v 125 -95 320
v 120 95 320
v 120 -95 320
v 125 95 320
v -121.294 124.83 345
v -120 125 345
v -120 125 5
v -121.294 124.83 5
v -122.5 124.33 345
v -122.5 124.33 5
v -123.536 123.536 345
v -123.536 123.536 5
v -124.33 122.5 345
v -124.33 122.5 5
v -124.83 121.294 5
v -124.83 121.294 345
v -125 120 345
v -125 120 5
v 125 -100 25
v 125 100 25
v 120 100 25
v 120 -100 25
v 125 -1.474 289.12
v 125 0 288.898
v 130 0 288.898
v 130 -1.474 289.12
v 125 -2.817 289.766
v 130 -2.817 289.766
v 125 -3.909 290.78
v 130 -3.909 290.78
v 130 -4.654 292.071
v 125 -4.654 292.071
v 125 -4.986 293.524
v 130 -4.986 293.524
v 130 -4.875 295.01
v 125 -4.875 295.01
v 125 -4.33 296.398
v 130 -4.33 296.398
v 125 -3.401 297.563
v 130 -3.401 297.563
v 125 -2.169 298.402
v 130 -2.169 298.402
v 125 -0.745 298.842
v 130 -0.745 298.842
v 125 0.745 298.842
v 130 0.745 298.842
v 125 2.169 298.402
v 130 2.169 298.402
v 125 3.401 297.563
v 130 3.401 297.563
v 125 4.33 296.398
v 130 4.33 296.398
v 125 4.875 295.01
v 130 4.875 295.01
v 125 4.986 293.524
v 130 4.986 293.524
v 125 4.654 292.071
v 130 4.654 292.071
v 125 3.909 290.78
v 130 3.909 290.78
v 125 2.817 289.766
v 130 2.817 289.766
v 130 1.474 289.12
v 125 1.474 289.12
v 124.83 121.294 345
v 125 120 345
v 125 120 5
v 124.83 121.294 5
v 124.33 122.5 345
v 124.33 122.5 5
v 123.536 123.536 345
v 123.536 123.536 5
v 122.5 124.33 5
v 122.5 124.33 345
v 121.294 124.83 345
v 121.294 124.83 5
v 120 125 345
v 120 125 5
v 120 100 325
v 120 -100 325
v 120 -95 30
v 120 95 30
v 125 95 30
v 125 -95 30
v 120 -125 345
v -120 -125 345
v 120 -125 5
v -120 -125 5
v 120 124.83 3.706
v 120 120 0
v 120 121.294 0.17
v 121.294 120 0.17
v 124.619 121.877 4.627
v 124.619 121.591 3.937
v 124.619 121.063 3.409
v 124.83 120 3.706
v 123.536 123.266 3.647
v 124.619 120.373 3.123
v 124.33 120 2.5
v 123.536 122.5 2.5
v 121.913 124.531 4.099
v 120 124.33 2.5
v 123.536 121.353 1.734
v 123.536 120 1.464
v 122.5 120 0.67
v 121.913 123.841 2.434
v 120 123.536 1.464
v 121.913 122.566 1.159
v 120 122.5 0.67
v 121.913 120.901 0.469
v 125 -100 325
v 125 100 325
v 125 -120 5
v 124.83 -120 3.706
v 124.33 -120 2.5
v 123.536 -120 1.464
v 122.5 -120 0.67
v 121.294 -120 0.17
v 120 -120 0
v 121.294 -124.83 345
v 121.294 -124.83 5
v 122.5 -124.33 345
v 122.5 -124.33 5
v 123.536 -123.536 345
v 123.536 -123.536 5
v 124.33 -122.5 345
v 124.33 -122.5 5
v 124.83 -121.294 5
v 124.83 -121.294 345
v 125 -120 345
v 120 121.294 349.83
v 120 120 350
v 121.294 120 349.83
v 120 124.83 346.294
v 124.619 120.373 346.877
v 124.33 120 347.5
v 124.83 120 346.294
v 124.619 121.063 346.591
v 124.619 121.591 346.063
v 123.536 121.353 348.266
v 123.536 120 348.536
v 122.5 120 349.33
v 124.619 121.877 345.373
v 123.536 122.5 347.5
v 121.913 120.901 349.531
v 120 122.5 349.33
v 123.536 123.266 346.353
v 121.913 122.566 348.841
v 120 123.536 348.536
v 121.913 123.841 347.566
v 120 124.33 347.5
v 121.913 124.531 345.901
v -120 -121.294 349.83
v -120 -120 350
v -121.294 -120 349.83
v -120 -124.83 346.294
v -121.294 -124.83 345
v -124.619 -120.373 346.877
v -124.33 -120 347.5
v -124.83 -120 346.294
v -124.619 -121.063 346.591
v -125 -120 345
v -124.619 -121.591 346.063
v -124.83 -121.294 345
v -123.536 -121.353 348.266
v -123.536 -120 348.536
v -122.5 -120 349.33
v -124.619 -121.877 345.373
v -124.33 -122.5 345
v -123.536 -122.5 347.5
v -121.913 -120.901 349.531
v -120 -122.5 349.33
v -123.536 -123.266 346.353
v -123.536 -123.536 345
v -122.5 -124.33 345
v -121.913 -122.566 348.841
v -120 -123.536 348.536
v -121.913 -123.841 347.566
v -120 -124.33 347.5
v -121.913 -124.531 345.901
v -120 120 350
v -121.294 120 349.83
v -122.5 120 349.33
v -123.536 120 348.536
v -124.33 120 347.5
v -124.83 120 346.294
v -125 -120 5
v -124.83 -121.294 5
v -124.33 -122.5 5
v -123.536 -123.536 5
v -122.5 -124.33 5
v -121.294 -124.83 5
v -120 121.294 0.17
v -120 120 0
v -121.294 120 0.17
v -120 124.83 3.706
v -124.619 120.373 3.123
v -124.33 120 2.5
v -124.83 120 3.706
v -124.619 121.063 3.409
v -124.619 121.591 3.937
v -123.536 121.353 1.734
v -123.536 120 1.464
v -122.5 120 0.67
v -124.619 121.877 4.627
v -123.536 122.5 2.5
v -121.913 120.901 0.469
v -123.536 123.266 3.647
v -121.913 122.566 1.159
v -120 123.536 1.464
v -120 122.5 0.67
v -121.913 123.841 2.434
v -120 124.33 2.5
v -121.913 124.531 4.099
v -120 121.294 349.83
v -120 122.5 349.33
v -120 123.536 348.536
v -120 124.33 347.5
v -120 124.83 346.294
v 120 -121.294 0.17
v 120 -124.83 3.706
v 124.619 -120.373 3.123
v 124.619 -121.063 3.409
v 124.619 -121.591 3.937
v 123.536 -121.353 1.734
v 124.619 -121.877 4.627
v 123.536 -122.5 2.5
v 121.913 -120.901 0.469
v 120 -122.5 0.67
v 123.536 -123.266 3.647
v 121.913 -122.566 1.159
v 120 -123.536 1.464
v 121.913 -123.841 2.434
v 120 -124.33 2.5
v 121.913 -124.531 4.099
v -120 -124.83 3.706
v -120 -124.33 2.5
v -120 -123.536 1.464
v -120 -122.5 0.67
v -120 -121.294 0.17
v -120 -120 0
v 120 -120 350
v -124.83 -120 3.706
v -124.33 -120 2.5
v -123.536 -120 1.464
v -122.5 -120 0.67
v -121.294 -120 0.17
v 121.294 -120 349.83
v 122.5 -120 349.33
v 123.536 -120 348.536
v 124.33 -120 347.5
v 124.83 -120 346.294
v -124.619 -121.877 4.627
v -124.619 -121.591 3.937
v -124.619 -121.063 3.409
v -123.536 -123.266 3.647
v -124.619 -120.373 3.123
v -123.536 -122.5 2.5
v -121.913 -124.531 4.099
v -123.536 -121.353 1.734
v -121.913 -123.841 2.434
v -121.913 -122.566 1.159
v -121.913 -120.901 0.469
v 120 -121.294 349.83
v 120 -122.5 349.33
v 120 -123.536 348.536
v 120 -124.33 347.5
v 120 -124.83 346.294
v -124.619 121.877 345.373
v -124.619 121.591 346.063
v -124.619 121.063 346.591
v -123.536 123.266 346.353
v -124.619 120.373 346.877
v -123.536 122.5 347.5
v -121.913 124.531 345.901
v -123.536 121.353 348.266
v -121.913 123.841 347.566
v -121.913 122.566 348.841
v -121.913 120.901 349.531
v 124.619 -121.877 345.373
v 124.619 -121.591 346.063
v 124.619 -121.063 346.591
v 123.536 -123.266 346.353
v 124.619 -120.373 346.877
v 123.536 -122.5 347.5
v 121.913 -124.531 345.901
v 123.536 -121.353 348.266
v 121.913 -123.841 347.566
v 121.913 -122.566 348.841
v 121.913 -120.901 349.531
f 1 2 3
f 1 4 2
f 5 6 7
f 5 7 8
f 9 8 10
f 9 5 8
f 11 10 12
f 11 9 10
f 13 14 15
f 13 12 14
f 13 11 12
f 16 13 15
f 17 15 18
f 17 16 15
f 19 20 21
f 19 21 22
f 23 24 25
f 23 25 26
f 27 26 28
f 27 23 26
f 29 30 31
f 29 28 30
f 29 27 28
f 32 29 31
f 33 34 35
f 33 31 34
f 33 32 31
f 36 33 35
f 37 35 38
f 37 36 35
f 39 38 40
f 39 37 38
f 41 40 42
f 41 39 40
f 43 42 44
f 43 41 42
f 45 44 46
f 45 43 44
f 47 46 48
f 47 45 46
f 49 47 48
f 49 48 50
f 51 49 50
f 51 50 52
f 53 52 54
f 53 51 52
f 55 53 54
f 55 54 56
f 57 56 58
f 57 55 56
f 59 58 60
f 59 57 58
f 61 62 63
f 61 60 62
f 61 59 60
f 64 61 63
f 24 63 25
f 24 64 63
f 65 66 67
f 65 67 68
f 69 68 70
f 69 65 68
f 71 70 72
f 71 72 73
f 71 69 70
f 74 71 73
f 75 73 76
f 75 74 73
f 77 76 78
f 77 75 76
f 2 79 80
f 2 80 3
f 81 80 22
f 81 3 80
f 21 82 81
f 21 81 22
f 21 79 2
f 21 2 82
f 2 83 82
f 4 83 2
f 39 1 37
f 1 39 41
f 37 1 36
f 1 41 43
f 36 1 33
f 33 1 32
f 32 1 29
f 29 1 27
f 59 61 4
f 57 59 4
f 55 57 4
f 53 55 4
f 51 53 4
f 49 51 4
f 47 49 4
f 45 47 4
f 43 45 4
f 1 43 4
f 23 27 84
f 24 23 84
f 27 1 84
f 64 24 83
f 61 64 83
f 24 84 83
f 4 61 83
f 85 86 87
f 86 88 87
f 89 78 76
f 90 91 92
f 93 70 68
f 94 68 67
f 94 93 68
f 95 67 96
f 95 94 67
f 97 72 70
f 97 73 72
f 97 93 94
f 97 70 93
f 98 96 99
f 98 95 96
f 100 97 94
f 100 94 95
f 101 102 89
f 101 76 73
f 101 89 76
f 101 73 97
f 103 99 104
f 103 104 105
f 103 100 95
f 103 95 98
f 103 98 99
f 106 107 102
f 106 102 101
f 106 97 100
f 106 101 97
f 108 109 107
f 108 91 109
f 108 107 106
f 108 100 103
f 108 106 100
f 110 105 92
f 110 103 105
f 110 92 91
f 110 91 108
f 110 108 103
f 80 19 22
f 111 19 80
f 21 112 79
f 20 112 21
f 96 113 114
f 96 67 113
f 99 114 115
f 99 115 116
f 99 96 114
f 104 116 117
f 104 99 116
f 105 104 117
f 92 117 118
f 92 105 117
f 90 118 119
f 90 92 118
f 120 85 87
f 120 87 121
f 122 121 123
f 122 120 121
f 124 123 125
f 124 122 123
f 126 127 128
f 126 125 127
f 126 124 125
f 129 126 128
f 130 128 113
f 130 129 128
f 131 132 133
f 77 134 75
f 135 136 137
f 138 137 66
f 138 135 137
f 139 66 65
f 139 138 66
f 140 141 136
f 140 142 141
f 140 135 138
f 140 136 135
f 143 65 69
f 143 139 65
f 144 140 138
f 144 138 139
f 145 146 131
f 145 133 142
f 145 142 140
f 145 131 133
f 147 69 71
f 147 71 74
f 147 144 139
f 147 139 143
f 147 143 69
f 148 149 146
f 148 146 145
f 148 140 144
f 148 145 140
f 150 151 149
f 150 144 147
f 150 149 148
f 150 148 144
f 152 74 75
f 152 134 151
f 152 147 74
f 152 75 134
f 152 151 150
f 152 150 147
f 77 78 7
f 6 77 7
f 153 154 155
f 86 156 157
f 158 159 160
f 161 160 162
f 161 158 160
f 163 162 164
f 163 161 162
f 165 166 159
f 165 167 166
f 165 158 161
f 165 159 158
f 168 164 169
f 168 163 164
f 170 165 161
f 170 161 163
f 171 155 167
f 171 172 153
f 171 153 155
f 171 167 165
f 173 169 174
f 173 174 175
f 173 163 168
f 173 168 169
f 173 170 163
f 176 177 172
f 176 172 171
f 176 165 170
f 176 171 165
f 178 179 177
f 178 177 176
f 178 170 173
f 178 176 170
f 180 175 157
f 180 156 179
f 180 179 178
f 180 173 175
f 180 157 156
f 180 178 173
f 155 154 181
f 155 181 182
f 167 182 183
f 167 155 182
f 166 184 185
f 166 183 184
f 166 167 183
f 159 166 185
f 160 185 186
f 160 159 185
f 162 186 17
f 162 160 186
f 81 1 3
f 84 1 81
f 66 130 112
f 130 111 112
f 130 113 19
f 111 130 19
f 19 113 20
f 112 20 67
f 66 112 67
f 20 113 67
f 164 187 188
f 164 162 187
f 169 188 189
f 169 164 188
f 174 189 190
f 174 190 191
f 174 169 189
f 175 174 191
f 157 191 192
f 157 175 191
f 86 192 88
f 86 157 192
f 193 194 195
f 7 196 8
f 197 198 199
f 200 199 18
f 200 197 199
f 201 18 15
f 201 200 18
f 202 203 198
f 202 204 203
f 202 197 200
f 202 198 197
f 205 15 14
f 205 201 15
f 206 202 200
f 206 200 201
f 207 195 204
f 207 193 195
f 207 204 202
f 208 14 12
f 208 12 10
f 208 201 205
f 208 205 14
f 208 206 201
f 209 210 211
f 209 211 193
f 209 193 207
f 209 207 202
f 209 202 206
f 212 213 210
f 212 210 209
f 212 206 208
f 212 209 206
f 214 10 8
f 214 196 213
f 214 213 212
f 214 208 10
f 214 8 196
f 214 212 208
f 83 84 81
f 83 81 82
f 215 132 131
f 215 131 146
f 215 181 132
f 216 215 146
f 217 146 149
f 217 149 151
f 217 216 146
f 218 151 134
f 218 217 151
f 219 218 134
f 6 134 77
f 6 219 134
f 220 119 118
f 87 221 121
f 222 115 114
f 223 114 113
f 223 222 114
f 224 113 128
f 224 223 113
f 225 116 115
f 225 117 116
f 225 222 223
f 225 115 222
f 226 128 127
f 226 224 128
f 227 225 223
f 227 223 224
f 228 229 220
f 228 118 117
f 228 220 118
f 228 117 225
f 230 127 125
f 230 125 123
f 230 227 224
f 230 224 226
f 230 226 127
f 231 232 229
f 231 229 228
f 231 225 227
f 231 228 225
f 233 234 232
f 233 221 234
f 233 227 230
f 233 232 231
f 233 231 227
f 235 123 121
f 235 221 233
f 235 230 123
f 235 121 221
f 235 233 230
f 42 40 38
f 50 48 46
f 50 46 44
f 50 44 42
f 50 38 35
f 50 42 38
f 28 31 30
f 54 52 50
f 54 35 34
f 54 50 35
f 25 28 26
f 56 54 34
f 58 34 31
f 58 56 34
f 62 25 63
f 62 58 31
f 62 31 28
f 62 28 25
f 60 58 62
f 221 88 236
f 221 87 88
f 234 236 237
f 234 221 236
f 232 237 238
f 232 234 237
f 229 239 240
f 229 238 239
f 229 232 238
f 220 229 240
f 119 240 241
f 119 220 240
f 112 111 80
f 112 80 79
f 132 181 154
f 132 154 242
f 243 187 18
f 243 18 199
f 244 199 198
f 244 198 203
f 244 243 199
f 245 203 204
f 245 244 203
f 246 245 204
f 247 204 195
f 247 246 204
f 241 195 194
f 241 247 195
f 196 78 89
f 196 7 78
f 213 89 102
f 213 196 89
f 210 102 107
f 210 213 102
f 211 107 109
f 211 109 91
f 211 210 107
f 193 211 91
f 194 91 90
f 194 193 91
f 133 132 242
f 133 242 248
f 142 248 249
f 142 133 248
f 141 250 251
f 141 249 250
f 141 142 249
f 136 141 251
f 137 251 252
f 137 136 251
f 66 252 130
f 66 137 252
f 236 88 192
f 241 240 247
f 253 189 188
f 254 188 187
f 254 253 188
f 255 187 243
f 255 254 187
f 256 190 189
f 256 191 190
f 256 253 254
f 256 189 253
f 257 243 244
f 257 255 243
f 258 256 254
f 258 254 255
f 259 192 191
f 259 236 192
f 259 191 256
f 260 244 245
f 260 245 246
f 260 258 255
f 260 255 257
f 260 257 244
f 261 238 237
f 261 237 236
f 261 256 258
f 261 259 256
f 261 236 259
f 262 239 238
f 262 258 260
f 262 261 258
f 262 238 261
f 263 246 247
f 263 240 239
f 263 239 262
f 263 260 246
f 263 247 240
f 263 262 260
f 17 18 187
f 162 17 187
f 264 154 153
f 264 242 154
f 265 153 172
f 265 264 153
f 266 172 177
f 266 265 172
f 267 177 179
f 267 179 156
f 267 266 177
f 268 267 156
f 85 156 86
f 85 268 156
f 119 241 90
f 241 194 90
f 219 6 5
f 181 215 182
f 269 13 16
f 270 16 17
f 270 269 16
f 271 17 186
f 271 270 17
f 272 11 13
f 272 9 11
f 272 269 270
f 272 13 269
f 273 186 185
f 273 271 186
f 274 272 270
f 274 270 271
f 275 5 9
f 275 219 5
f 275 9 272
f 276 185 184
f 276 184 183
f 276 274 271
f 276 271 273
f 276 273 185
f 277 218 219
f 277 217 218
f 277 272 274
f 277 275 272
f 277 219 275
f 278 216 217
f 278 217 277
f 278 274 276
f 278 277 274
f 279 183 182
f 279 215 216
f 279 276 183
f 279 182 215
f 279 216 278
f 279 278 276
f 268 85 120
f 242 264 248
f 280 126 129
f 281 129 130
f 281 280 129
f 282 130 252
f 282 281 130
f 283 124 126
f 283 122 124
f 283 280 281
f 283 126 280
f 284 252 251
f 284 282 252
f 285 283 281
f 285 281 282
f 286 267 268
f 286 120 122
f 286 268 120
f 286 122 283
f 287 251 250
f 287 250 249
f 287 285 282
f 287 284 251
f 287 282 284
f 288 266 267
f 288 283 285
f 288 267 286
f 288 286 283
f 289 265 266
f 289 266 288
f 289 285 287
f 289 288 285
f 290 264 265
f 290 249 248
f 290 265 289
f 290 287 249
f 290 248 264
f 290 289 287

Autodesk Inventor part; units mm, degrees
ref_plane "YZ Plane" through (0, 0, 0) normal (1, 0, 0) x (0, 1, 0)
ref_plane "XZ Plane" through (0, 0, 0) normal (0, 1, 0) x (-1, 0, 0)
ref_plane "XY Plane" through (0, 0, 0) normal (0, 0, 1) x (1, 0, 0)
sketch "Boceto1" plane through (0, 0, 0) normal (0, 0, 1) x (1, 0, 0)
  line L0 (125, 125) -> (-125, 125)
  line L1 (-125, 125) -> (-125, -125)
  line L2 (-125, -125) -> (125, -125)
  line L3 (125, -125) -> (125, 125)
  line L4 (125, 125) -> (-125, -125) construction
  line L5 (-125, 125) -> (125, -125) construction
  point P0 (0, 0)
  dimension "d0" = 250
  dimension "d1" = 250
extrude "Extrusión1" add sketch "Boceto1" along normal blind 350
sketch "Boceto2" plane through (125, -125, 0) normal (1, 0, 0) x (0, 0, -1)
  line L0 (0, 0) -> (0, 250) projected
  line L1 (0, 250) -> (-350, 250) projected
  line L2 (-350, 0) -> (-350, 250) projected
  line L3 (0, 0) -> (-350, 0) projected
  line L4 (-325, 225) -> (-25, 225)
  line L5 (-25, 225) -> (-25, 25)
  line L6 (-25, 25) -> (-325, 25)
  line L7 (-325, 25) -> (-325, 225)
  line L8 (-30, 220) -> (-320, 220)
  line L9 (-320, 220) -> (-320, 30)
  line L10 (-320, 30) -> (-30, 30)
  line L11 (-30, 30) -> (-30, 220)
  point P0 (0, 125)
  dimension "d4" = 25
  dimension "d5" = 5
extrude "Extrusión2" cut sketch "Boceto2" against normal blind 5 contours L4 L5 L6 L7
sketch "Boceto3" plane through (125, -95, 30) normal (1, 0, 0) x (0, 0, -1)
  line L0 (-290, 0) -> (0, 0) projected
  line L1 (0, 0) -> (0, 190) projected
  line L2 (0, 190) -> (-290, 190) projected
  line L3 (-290, 190) -> (-290, 0) projected
  circle A0 centre (-263.8975, 95) radius 5
  point P0 (30, 95)
  dimension "d8" = 10
extrude "Extrusión3" add sketch "Boceto3" along normal blind 5 contours A0
fillet "Empalme1" radius 5 12 edges at (0, 125, 350) (0, 125, 0) (0, -125, 350) (0, -125, 0) (-125, 125, 175) (-125, 0, 0) (-125, 0, 350) (-125, -125, 175) (125, 0, 350) (125, 125, 175) (125, 0, 0) (125, -125, 175)
